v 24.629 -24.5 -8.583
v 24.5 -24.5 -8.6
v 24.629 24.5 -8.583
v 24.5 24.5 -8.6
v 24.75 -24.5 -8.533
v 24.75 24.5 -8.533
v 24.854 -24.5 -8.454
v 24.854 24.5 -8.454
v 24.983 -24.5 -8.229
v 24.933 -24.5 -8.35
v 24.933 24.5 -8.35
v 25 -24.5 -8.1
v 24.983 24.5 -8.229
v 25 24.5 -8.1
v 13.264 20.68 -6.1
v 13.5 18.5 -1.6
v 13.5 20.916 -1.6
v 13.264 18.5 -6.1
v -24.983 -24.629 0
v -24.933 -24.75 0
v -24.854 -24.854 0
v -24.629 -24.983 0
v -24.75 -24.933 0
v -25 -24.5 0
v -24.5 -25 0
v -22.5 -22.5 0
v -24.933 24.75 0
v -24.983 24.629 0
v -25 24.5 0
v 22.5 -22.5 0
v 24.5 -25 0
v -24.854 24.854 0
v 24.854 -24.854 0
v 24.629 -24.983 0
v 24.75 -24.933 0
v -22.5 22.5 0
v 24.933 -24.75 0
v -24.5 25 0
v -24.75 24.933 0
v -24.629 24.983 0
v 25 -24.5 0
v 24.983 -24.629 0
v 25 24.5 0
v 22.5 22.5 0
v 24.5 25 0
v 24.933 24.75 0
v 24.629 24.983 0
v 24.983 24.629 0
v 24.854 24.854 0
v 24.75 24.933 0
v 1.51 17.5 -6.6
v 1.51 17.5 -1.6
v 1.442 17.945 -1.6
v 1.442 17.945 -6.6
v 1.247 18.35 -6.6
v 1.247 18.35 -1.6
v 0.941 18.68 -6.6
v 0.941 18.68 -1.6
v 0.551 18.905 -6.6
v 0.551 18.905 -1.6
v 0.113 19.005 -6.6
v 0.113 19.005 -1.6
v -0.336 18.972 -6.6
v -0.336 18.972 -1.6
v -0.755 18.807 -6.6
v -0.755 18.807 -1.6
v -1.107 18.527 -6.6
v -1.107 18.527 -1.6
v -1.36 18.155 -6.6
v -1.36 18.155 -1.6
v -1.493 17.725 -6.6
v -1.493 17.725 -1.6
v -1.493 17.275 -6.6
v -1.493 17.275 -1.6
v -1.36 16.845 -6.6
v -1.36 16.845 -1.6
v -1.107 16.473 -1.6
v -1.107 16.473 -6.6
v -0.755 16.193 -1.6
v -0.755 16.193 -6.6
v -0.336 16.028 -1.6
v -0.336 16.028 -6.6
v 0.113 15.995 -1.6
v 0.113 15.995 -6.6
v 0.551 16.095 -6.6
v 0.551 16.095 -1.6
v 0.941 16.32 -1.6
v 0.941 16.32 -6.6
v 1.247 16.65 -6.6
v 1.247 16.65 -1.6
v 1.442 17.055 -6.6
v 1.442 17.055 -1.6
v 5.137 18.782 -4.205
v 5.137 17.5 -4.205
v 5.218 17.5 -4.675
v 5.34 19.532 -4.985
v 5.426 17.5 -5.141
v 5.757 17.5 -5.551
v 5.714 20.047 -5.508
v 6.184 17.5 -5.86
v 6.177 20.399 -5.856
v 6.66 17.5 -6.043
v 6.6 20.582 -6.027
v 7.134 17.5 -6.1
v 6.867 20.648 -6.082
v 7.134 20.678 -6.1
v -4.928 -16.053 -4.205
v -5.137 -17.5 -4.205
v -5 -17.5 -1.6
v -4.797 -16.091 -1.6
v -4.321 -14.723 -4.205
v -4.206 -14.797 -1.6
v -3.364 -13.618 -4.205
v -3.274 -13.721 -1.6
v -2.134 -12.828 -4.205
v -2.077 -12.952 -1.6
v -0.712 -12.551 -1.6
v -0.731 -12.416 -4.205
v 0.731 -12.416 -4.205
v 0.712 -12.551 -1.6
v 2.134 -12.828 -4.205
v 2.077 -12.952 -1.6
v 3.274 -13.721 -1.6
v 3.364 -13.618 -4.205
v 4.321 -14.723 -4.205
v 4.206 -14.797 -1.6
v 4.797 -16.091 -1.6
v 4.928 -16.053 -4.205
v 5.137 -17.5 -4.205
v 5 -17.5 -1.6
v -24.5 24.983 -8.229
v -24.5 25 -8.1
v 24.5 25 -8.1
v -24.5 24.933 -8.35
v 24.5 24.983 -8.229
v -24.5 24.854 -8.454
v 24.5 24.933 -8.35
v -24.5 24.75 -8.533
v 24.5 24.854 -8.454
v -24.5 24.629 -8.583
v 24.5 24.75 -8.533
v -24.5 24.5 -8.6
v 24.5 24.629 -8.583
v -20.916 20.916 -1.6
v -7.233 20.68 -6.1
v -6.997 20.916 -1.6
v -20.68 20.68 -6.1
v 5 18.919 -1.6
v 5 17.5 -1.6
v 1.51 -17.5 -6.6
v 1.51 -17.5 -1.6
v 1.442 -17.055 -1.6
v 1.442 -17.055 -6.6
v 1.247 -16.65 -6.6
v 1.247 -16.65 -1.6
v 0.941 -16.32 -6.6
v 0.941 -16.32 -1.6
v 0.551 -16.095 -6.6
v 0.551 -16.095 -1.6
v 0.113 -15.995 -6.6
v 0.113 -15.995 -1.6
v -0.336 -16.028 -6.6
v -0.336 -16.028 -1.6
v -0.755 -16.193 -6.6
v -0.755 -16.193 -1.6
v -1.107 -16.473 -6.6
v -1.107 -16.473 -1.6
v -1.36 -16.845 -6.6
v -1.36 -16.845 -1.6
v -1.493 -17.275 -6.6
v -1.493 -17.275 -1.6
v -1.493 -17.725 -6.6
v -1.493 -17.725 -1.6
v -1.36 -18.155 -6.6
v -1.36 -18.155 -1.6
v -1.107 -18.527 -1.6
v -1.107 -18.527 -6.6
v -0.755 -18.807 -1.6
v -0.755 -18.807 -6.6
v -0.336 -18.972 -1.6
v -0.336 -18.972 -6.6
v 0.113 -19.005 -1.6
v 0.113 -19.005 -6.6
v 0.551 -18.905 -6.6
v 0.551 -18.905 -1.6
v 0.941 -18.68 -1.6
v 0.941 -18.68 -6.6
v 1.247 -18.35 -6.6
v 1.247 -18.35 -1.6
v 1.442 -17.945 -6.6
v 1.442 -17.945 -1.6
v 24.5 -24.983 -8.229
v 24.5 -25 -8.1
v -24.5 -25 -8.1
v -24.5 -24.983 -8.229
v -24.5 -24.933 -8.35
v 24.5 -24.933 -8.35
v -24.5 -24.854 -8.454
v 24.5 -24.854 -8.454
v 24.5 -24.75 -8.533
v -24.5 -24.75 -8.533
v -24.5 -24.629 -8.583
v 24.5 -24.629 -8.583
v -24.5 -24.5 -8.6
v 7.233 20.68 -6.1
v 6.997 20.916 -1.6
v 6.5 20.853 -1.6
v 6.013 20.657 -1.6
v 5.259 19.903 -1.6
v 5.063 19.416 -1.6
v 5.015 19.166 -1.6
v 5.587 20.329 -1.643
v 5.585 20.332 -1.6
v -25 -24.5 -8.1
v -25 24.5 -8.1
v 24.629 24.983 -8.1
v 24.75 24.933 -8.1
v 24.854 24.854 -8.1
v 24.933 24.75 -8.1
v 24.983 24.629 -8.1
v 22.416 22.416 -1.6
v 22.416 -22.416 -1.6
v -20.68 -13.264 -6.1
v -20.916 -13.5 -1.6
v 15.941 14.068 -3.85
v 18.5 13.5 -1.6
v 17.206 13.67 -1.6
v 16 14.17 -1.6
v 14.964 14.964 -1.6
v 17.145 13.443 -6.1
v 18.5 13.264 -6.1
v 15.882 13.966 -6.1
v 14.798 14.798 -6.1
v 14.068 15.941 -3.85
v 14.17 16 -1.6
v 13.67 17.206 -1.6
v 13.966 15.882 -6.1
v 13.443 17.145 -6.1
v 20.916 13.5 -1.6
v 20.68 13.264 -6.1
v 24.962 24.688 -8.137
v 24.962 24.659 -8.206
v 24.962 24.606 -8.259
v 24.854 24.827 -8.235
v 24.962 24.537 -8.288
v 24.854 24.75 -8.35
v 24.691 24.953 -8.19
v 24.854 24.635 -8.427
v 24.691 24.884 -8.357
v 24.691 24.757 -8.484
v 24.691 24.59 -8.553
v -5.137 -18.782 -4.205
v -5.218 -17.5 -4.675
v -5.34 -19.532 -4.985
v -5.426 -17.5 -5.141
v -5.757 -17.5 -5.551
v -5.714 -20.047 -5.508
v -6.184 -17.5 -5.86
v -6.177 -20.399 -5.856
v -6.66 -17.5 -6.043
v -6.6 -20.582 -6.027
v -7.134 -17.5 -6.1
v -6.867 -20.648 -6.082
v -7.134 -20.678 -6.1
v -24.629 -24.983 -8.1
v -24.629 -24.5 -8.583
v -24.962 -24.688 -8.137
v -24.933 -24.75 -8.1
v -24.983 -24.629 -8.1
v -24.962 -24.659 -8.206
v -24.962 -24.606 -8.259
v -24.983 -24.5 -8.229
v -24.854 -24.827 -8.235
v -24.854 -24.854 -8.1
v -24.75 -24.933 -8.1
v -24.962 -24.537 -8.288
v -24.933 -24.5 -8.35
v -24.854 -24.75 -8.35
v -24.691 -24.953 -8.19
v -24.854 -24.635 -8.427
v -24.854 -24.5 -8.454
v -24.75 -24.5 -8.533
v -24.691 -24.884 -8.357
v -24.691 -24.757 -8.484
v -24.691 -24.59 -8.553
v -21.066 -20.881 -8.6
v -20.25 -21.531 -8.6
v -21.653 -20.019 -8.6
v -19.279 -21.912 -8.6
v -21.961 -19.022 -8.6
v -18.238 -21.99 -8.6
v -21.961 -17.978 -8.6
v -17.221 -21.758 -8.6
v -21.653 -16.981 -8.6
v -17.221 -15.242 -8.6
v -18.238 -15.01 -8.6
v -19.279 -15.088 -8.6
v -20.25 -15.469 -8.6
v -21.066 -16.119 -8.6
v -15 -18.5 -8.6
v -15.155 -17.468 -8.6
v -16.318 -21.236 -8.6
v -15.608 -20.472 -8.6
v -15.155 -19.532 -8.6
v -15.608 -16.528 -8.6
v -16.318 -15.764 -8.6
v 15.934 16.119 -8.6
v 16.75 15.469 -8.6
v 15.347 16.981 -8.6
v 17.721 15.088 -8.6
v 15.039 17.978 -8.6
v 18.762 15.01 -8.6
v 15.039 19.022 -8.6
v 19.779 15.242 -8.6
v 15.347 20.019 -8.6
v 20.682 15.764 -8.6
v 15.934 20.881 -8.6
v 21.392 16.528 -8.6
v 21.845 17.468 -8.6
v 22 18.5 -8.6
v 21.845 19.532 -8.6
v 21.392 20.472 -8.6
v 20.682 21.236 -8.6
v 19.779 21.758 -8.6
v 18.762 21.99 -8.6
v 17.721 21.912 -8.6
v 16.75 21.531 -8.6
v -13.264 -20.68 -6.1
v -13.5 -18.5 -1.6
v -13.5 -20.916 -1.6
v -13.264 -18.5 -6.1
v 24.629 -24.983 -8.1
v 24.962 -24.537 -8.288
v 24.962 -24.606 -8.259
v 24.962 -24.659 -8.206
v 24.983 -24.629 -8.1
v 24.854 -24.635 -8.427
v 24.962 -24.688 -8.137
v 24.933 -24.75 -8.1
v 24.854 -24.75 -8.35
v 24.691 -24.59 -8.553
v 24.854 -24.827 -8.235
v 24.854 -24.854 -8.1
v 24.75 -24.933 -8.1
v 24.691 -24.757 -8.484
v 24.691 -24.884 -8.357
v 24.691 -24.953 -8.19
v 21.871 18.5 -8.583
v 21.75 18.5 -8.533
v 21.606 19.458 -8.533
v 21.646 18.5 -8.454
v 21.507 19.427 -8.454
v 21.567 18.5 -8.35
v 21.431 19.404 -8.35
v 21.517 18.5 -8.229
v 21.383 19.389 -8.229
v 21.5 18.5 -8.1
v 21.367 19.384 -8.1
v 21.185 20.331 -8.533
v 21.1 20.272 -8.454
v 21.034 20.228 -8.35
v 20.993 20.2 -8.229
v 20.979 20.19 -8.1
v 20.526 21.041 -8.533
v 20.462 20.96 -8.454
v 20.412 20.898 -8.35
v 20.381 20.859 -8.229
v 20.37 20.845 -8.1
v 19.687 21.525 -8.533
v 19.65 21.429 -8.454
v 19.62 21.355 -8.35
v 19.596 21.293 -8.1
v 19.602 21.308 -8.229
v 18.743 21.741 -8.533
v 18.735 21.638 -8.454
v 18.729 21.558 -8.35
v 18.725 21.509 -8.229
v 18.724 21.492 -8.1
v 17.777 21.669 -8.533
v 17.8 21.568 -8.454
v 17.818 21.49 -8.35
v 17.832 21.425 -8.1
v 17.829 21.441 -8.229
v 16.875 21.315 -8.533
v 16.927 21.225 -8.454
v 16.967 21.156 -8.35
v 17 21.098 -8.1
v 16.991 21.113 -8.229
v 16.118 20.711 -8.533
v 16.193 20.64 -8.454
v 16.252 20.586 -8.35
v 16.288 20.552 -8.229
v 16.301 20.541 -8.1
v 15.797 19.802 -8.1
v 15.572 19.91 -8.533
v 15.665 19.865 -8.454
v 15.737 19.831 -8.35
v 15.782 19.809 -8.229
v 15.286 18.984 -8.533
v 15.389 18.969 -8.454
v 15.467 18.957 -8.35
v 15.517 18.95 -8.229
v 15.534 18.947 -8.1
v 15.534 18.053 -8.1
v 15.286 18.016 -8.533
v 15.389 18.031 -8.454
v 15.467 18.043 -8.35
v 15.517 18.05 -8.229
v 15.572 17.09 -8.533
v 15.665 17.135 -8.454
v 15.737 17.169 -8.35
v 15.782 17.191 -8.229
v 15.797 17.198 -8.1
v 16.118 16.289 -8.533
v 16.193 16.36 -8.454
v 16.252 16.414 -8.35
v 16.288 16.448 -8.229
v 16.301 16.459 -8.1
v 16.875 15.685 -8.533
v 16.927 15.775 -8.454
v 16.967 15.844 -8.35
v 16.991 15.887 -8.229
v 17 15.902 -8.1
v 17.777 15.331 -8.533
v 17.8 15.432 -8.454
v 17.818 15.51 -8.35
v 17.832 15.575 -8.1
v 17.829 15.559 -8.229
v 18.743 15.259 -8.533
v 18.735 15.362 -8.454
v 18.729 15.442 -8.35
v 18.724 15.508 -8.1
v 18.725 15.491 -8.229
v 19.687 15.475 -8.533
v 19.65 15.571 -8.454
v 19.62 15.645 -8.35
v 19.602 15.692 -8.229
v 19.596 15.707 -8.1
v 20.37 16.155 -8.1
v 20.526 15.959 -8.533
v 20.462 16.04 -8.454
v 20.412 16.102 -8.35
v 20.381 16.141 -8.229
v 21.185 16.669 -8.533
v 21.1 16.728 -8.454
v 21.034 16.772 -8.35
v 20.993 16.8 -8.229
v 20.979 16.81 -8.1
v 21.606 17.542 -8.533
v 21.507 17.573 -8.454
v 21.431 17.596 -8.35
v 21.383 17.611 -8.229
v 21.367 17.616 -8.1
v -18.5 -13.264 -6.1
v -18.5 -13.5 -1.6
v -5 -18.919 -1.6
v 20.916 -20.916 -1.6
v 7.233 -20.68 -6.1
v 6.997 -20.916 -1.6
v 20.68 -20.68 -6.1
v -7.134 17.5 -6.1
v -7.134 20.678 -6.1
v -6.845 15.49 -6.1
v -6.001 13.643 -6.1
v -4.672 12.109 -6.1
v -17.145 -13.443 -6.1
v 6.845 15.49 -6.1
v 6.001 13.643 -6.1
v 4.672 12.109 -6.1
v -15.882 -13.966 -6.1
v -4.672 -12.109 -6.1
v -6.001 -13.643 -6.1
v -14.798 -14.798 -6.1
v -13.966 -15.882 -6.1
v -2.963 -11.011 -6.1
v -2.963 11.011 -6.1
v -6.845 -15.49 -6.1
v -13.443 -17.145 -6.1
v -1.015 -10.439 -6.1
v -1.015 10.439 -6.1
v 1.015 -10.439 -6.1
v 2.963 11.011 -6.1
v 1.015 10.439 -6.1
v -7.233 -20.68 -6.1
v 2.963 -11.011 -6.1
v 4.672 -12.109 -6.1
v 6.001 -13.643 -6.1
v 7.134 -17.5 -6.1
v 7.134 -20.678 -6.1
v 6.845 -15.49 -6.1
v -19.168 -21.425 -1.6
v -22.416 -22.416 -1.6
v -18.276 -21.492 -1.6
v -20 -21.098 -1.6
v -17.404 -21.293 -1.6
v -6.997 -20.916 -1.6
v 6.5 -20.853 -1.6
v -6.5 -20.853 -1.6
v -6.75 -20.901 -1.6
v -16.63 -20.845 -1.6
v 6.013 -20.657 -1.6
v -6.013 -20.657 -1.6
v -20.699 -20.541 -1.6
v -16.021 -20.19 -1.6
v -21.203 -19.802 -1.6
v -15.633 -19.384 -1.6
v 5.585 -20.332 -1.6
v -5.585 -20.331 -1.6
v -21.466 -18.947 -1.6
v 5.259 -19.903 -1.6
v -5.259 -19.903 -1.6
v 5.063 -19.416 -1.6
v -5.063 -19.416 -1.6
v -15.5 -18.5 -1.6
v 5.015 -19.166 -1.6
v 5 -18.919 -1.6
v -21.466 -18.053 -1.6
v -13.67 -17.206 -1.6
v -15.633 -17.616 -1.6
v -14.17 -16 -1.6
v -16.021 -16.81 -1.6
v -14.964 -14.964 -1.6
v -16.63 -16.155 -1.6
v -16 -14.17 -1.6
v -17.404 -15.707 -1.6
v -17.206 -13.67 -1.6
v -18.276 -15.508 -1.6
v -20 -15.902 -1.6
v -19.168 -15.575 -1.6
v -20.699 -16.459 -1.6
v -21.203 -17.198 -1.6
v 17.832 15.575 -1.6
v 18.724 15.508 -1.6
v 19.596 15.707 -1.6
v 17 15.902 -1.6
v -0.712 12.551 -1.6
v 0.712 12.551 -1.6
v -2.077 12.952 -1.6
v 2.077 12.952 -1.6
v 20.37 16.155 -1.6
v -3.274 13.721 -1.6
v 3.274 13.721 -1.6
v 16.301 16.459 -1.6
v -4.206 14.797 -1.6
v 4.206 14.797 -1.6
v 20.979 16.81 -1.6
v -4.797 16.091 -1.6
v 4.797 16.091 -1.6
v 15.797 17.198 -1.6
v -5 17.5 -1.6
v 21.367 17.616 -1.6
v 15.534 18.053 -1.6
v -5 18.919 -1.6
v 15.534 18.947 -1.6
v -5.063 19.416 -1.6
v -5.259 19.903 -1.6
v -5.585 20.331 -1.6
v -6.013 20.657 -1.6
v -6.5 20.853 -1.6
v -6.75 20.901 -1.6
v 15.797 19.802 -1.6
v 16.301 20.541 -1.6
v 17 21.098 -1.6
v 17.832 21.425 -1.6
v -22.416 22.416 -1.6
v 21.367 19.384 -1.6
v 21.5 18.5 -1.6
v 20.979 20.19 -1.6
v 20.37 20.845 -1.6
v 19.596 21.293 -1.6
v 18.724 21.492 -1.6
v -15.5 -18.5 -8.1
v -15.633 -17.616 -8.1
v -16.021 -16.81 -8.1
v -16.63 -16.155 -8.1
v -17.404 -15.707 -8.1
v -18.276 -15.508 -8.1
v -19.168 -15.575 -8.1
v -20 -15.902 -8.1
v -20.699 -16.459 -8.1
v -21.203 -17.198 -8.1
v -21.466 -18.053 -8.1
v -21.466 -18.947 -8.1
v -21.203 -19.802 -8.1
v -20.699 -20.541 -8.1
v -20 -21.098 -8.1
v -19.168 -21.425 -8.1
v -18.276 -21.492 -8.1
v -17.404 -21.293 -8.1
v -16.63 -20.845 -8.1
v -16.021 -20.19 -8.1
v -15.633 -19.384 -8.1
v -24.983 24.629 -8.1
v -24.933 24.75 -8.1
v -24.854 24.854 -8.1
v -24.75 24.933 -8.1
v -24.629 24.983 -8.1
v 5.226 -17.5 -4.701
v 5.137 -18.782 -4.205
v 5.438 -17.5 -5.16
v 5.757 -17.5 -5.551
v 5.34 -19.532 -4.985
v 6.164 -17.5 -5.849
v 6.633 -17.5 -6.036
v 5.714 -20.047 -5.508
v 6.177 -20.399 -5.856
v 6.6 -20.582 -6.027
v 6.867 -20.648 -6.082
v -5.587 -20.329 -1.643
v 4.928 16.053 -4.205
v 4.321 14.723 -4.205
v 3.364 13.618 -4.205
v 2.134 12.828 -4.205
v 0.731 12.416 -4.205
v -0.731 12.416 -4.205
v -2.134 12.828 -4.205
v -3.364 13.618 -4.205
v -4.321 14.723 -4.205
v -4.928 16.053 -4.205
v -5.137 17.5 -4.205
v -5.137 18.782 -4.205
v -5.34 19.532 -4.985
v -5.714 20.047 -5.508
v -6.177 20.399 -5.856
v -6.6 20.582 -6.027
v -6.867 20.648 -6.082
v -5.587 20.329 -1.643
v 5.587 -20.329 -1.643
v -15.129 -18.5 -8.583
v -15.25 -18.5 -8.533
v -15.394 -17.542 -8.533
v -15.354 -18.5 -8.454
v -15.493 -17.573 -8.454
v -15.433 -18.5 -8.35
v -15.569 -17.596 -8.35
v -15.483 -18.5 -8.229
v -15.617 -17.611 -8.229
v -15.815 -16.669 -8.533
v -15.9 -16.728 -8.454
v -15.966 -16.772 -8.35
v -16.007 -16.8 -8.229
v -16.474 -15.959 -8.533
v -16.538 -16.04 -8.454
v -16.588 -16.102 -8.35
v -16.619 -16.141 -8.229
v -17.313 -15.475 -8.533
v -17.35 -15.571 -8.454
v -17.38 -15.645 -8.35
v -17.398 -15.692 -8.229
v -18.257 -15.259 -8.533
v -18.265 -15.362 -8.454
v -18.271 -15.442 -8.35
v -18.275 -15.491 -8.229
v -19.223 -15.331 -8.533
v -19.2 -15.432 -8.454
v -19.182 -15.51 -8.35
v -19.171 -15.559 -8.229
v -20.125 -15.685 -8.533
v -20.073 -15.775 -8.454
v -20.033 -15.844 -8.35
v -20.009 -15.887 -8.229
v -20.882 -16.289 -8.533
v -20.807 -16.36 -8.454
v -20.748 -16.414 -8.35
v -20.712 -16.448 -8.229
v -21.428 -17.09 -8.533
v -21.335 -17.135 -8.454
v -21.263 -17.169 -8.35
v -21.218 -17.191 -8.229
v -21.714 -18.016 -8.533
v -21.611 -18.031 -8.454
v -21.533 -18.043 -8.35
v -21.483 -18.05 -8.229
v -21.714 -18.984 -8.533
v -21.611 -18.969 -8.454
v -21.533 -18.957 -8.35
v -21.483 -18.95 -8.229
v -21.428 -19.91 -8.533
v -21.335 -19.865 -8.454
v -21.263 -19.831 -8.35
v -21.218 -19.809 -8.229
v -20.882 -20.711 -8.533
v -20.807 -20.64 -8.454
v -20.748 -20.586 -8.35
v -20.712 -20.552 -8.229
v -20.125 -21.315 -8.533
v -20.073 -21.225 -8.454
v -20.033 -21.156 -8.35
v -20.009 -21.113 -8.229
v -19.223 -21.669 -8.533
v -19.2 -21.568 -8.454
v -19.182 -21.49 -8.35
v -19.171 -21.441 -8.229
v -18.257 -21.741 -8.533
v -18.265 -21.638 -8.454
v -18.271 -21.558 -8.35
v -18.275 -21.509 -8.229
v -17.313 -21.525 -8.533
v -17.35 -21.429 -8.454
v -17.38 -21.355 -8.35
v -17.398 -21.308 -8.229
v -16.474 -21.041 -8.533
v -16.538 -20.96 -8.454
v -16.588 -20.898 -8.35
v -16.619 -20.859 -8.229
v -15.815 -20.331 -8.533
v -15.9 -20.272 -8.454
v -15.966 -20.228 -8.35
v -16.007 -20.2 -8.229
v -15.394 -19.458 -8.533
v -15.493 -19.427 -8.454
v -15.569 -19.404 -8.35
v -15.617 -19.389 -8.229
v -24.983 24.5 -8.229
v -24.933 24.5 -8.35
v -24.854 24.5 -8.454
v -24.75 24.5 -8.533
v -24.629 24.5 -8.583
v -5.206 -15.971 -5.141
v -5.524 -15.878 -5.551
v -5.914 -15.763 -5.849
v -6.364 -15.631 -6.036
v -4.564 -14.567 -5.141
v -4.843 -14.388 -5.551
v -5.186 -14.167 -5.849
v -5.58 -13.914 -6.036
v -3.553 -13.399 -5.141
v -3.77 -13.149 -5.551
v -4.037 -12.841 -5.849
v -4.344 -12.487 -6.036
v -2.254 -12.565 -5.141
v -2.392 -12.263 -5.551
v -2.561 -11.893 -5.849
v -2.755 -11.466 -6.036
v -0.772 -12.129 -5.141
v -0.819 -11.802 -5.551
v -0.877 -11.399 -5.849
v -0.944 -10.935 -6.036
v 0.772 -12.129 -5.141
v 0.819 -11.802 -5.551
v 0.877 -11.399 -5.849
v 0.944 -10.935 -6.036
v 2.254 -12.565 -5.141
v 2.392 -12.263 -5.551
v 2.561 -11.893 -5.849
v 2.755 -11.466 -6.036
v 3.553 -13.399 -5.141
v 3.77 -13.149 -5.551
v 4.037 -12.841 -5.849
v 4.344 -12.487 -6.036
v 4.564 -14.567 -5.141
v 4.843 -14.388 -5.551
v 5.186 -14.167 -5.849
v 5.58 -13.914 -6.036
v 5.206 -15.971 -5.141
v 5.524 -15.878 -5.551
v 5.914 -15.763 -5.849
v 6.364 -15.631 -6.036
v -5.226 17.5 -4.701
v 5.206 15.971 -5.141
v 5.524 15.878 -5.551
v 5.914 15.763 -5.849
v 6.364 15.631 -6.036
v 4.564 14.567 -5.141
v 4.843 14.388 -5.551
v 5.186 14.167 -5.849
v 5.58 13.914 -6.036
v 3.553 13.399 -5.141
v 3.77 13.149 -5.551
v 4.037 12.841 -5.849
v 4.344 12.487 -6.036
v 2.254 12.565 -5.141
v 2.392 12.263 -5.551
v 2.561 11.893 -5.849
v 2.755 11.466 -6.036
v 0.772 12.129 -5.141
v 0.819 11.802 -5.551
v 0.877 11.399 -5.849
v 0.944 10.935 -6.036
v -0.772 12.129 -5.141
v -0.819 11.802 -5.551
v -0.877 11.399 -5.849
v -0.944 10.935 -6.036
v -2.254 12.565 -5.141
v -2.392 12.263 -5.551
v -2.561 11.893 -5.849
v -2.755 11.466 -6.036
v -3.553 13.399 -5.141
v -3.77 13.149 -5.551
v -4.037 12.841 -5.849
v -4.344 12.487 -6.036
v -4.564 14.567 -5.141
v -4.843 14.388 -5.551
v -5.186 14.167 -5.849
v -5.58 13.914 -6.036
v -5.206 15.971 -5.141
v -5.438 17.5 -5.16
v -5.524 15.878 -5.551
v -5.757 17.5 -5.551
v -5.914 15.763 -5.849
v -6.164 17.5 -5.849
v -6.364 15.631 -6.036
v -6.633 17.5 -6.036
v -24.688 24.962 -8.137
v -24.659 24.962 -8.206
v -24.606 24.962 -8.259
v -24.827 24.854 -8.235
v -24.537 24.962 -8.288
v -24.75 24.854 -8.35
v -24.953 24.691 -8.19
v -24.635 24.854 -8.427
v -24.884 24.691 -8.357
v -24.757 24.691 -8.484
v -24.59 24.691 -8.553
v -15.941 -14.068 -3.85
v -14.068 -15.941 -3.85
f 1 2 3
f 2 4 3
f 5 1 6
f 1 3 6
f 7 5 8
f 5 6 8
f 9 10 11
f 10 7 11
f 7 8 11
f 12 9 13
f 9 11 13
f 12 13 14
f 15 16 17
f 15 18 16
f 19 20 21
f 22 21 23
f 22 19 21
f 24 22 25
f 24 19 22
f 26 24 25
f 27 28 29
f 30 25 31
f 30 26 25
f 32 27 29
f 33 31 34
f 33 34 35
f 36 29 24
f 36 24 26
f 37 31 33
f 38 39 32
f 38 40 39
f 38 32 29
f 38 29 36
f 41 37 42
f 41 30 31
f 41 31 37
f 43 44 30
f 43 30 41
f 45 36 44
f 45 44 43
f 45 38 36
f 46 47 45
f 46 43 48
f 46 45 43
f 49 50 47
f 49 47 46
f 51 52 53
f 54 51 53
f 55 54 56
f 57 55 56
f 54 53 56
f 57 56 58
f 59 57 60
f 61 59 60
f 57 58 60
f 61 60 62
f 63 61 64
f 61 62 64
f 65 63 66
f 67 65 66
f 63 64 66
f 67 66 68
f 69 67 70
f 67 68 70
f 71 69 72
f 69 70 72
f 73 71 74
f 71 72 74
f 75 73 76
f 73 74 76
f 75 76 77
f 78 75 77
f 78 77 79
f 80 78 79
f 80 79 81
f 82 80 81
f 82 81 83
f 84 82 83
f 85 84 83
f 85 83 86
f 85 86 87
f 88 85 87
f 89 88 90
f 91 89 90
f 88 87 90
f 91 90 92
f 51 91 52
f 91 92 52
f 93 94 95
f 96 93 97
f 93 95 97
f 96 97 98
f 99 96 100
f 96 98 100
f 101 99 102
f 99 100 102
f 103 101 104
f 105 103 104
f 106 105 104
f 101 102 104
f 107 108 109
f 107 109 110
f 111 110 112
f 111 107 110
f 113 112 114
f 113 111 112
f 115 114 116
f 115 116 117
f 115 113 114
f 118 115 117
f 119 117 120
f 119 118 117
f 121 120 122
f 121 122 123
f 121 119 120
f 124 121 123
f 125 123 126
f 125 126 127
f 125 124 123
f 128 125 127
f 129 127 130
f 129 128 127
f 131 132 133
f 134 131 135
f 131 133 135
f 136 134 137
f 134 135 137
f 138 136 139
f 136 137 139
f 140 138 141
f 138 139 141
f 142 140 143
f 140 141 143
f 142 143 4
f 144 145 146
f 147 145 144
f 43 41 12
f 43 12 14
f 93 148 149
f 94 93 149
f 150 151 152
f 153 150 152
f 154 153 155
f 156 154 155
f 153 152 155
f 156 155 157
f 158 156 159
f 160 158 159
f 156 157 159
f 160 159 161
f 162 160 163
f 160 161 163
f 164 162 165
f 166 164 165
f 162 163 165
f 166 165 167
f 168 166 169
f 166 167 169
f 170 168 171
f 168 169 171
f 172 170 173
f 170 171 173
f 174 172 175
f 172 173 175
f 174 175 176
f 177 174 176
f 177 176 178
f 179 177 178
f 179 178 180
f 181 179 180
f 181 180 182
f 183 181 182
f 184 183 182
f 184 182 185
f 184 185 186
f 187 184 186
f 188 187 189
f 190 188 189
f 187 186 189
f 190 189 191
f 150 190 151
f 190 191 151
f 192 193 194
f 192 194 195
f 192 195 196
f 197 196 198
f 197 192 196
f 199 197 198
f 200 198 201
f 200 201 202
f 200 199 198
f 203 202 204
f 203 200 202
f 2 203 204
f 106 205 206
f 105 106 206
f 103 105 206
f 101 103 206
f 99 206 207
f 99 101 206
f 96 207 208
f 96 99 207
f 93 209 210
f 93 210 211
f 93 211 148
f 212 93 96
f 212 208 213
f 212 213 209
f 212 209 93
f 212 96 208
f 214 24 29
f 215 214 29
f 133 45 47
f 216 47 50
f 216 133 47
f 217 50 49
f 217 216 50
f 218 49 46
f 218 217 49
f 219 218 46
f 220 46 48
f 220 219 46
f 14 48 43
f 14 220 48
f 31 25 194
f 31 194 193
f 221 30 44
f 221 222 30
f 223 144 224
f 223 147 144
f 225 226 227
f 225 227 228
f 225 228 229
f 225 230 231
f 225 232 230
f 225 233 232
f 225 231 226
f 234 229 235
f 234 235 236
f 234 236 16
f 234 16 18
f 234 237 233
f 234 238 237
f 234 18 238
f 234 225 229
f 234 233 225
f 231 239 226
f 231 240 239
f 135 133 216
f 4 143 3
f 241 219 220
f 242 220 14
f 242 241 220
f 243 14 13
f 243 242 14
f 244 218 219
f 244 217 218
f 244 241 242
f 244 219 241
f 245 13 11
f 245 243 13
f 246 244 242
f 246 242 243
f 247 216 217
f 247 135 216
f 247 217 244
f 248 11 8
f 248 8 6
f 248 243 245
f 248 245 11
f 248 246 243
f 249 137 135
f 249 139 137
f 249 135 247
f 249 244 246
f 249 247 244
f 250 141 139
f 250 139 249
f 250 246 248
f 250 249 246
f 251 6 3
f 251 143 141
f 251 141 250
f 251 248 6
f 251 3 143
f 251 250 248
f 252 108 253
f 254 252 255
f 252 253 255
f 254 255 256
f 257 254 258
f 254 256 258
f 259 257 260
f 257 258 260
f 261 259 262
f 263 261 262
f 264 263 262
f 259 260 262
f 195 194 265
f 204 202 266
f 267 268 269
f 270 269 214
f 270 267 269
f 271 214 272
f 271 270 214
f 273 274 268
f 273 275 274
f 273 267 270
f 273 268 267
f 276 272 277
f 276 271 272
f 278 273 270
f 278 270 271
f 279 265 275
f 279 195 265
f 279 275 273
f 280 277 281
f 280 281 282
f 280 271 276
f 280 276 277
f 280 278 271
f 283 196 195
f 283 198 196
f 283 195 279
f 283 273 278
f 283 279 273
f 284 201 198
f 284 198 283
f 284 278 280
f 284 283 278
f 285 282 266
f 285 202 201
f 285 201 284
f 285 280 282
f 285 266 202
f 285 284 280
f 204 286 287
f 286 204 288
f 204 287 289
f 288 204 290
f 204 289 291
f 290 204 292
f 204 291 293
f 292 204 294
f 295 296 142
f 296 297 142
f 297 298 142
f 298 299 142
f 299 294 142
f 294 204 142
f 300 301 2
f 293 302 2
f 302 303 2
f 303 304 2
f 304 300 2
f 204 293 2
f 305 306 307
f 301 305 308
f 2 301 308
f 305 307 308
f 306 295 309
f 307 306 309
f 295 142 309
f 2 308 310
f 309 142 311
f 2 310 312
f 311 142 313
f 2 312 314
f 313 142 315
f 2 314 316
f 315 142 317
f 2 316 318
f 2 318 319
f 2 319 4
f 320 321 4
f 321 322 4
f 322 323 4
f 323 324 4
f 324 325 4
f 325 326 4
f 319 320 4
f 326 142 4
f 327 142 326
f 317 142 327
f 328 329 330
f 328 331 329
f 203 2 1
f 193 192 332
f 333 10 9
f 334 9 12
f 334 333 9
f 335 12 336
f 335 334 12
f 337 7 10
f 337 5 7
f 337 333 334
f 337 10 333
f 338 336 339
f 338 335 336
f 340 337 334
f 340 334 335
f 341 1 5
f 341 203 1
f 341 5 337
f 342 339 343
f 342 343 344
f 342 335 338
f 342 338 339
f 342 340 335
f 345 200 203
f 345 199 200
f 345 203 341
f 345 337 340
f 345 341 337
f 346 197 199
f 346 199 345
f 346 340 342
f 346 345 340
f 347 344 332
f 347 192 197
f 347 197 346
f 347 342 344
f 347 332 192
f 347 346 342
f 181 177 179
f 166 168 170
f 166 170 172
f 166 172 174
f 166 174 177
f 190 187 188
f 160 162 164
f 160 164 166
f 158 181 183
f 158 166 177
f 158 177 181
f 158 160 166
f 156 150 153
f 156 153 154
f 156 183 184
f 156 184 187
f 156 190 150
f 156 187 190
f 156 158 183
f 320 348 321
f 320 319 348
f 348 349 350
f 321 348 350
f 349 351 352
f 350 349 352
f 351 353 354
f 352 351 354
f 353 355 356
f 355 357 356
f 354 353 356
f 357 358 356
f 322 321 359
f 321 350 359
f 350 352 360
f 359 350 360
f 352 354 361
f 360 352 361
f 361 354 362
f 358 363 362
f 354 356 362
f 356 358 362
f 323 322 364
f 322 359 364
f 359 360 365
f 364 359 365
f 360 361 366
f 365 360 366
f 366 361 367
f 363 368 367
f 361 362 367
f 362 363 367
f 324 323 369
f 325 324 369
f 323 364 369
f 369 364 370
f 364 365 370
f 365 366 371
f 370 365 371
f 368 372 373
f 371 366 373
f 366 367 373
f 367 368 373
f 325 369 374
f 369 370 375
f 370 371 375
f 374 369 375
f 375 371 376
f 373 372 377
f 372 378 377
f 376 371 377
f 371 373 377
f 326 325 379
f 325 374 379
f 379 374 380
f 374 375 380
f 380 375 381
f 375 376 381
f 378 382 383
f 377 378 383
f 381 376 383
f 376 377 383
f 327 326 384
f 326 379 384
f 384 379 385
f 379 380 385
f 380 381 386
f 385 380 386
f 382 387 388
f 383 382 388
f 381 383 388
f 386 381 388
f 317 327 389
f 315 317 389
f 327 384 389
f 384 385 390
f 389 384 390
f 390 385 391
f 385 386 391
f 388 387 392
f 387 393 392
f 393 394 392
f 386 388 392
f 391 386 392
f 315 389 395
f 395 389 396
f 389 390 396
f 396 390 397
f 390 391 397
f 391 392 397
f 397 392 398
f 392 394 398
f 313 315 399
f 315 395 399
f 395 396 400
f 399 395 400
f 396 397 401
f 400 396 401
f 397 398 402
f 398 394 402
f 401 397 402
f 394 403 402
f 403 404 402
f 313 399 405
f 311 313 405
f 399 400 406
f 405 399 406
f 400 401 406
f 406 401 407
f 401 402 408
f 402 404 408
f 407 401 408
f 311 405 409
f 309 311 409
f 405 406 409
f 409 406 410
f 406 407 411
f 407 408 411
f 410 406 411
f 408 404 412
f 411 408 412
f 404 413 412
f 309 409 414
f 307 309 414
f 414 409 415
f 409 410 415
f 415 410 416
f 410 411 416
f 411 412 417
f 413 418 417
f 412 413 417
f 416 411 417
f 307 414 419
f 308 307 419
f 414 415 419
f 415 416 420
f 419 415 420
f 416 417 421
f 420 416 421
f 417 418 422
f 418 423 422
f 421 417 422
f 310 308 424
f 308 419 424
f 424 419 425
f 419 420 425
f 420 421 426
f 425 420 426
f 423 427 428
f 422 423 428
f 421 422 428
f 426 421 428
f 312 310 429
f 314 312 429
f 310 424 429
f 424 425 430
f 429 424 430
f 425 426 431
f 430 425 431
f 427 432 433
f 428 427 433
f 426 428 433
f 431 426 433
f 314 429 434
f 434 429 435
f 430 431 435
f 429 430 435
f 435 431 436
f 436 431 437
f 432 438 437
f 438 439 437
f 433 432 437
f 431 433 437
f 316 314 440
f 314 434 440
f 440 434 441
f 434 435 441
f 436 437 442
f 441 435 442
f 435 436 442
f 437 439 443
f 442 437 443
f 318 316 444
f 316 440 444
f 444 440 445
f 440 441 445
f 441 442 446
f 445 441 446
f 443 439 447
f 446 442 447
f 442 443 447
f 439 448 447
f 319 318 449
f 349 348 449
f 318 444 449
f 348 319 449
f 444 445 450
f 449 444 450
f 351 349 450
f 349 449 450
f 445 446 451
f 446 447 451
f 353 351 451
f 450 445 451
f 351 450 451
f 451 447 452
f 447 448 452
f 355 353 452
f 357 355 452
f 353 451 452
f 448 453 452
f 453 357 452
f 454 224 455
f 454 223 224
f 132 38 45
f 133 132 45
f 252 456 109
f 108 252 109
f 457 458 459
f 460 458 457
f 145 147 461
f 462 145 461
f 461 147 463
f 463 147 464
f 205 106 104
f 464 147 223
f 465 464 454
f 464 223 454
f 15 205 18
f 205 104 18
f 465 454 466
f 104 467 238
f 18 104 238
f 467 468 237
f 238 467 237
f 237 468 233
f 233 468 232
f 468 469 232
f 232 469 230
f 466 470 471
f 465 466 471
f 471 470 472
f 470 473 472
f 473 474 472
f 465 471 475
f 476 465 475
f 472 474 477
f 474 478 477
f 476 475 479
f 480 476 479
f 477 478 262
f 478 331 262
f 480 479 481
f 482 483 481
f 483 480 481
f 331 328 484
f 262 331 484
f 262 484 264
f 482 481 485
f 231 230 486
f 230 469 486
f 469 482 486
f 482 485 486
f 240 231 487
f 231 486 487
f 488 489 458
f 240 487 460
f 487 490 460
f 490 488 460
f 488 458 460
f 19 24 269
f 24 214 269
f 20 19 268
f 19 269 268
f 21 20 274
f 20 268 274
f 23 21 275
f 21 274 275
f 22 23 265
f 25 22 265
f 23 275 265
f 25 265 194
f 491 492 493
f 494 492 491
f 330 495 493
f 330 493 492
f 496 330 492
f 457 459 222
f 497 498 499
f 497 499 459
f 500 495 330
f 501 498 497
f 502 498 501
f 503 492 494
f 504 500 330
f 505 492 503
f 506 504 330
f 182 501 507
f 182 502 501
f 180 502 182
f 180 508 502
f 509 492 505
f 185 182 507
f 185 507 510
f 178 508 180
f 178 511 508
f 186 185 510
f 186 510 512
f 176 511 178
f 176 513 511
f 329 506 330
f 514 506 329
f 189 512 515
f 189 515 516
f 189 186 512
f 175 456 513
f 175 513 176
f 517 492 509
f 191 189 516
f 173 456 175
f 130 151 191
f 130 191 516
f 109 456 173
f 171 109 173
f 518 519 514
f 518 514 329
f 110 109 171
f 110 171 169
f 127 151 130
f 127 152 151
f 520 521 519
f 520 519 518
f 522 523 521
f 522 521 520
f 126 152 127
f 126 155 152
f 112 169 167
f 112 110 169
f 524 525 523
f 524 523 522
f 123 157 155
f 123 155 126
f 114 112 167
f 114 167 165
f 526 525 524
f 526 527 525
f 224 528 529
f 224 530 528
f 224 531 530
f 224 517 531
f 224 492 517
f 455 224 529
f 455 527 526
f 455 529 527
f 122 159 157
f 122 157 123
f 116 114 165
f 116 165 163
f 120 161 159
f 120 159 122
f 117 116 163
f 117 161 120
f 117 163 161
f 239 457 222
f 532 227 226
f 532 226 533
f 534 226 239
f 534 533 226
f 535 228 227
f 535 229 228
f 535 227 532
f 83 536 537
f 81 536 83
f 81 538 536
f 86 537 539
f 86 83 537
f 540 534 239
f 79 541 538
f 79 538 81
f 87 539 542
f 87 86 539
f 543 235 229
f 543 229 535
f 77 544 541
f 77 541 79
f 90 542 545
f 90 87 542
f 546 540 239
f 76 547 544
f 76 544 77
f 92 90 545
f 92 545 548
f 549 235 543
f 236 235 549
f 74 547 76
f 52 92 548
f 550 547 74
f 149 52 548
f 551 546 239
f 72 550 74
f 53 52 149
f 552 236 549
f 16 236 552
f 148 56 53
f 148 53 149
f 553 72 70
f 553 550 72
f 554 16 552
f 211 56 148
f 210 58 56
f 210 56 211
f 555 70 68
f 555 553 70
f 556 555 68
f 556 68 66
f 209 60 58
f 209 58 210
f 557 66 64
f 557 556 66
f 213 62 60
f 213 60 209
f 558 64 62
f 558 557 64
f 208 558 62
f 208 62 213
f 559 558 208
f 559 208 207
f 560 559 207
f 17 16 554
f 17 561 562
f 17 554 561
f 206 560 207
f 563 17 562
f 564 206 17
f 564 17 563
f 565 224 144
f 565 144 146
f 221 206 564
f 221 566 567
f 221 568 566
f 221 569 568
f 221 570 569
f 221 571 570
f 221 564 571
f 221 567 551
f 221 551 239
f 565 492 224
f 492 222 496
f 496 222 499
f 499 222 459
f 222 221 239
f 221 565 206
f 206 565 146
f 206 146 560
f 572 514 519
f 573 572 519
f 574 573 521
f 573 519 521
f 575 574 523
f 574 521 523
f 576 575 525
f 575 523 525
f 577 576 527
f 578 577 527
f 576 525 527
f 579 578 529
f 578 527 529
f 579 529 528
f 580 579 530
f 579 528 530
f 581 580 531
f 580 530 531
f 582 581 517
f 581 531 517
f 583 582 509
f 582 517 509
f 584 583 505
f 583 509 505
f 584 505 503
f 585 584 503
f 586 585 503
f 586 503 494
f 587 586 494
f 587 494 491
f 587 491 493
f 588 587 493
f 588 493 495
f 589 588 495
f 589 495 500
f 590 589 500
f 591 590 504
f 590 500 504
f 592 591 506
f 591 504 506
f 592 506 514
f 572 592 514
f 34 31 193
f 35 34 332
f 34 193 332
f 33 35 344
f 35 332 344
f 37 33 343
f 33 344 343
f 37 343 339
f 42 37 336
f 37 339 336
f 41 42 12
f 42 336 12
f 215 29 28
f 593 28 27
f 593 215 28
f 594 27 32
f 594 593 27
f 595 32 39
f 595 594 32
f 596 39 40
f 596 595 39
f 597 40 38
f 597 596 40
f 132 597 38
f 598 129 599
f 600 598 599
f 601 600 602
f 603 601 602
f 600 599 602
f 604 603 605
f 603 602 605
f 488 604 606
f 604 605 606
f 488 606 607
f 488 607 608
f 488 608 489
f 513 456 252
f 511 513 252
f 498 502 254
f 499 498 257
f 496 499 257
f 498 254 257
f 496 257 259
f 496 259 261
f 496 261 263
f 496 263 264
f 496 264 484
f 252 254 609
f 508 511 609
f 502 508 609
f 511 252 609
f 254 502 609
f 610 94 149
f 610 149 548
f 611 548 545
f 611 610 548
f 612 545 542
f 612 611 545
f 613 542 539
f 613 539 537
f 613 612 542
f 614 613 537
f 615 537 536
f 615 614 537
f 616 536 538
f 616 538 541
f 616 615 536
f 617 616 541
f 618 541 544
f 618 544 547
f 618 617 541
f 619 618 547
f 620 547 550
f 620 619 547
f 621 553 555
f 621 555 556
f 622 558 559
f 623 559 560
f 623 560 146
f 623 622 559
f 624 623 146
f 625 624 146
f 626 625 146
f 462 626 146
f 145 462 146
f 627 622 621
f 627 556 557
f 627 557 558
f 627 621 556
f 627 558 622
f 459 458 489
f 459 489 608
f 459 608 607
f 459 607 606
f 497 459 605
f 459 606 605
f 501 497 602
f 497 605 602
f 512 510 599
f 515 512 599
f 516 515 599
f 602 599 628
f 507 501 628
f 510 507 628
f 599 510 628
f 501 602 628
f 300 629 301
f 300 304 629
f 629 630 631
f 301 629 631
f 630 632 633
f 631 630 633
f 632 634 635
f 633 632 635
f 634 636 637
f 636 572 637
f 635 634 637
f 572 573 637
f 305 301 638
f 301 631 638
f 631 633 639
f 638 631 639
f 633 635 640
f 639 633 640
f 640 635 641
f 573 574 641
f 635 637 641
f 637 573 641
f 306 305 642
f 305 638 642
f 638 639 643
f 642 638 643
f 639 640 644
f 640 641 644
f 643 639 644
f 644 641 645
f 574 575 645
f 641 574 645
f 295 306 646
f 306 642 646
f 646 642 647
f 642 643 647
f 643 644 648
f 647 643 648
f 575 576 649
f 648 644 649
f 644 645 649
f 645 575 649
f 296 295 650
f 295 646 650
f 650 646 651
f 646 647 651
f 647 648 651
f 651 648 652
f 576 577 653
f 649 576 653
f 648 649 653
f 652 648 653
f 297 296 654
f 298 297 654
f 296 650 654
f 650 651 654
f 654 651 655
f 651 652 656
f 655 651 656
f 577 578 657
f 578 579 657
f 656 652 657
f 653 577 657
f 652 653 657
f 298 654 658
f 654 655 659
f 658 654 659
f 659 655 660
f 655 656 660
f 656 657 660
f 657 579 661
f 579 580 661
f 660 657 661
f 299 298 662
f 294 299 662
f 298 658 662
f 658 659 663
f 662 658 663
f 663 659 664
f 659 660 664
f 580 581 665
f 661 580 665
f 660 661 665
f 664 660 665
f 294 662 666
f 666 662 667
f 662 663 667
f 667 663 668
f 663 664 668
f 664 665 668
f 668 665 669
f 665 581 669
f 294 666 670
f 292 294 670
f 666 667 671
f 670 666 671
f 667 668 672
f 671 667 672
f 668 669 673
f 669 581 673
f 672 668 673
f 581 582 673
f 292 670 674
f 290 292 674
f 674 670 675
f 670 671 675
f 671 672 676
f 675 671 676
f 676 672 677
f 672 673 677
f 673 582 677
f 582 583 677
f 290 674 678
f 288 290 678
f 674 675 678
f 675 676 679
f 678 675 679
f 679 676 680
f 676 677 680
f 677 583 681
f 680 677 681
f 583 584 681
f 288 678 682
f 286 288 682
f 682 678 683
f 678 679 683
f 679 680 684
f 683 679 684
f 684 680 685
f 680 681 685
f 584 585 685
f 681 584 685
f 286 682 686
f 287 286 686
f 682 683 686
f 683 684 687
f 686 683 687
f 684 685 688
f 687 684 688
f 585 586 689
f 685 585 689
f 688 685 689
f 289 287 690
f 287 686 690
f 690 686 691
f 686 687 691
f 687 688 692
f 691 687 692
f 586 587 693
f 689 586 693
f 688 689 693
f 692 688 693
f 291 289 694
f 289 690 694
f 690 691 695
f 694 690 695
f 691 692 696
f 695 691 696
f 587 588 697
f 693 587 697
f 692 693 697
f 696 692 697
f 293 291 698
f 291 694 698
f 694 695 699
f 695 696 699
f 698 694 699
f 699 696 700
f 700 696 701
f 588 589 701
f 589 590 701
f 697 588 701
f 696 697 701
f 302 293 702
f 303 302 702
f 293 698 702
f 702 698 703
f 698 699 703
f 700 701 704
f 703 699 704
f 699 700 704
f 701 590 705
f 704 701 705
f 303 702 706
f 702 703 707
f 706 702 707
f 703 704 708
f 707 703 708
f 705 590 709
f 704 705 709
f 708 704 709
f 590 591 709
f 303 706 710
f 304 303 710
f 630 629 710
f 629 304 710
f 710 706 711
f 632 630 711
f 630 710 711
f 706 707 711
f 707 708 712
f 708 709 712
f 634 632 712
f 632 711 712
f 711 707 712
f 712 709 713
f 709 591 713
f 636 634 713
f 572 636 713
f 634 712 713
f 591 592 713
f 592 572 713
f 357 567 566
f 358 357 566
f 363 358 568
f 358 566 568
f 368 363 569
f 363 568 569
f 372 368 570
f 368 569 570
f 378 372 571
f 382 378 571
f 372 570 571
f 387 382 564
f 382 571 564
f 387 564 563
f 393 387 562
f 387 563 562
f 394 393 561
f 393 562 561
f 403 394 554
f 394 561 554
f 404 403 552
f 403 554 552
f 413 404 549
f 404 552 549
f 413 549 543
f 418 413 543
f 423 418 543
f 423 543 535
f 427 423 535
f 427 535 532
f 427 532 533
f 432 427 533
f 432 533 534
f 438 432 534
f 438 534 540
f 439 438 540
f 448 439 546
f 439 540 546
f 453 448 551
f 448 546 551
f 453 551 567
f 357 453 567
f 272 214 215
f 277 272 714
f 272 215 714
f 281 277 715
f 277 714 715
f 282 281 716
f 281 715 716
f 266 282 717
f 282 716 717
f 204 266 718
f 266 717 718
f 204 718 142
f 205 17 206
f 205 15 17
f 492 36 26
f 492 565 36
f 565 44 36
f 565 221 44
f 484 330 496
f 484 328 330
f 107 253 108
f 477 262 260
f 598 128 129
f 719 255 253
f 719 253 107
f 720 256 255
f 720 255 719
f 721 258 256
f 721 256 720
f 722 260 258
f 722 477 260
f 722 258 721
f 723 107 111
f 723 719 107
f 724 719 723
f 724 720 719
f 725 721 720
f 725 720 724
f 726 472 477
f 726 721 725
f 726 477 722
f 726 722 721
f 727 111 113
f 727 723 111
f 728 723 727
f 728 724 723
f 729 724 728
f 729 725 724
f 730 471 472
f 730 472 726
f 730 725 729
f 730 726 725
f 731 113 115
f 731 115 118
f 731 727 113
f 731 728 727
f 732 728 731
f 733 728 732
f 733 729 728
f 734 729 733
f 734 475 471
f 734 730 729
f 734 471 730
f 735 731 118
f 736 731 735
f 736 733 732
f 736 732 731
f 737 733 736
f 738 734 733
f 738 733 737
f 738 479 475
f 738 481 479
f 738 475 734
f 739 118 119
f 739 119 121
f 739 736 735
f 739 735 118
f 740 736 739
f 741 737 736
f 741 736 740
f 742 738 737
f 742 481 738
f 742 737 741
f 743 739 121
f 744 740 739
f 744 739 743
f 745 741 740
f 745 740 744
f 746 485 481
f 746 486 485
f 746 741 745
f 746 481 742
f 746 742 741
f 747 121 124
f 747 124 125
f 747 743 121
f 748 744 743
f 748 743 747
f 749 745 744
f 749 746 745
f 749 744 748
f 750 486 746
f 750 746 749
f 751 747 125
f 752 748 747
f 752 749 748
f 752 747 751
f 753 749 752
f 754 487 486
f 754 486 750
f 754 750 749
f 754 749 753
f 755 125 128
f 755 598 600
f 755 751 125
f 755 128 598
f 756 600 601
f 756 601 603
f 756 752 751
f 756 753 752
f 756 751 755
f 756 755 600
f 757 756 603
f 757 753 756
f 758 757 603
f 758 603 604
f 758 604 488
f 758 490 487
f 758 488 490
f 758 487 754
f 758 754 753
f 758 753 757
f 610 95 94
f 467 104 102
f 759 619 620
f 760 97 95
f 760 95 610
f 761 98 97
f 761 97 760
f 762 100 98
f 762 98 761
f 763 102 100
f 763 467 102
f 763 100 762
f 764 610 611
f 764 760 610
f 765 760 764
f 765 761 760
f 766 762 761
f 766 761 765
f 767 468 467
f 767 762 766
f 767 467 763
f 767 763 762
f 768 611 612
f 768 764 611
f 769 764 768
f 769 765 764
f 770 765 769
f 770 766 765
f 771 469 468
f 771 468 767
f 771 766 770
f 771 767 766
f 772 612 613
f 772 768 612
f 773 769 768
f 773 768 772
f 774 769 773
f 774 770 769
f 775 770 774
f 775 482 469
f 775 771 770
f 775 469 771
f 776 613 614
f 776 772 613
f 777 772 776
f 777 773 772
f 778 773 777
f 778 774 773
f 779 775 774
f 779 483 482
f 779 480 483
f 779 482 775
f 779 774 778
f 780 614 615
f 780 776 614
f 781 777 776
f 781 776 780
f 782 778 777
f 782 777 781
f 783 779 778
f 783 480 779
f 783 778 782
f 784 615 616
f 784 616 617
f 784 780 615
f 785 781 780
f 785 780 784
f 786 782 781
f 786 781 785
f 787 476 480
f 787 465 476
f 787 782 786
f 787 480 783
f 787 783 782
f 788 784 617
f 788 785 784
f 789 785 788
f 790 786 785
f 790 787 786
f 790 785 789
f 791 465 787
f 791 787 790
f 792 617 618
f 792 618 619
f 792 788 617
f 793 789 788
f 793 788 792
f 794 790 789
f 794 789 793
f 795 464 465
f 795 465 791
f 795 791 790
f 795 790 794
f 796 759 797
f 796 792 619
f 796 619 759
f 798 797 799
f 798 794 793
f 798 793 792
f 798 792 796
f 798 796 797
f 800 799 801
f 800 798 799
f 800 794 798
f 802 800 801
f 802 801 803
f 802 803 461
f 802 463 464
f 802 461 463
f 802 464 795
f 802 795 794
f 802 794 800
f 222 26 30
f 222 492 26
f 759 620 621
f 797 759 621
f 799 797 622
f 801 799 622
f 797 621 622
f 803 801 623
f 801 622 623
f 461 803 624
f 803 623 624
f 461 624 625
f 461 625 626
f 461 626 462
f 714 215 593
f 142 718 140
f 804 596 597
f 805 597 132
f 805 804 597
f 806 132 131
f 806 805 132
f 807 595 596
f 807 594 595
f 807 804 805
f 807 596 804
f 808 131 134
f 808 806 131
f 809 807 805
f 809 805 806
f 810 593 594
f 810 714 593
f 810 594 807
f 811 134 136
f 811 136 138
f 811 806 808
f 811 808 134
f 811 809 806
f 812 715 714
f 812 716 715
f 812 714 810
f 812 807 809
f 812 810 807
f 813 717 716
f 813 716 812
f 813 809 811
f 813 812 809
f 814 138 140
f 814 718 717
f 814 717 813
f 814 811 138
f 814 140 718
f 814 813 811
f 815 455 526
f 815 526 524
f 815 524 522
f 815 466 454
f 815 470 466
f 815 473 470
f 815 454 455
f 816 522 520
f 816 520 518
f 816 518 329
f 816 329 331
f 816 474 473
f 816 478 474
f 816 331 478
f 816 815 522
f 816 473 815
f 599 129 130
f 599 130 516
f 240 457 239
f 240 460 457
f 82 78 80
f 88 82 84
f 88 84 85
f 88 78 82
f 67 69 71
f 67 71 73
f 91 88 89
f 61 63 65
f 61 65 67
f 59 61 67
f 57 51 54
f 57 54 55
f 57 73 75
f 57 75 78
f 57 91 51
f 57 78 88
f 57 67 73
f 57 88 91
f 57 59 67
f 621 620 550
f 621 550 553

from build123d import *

# Parameters (mm, degrees)
F0_W      = 50
F0_H      = 50
F1_DEPTH  = 8.6
F2_W      = 45
F2_H      = 45
F3_DEPTH  = 1.6
F3_TAPER  = 3
F5_DEPTH  = 4.5
F5_TAPER  = 3
F6_R      = 3
F7_DEPTH  = 7
F8_R      = 0.5
F9_R      = 1.5095
F10_DEPTH = 5
F11_R     = 2


with BuildPart() as f1:
    # F0 (on Top) → F1 (new body)
    with BuildSketch(Plane.XY):
        Rectangle(F0_W, F0_H)
    extrude(amount=-F1_DEPTH)

    # F2 (on face) → F3 (cut)
    with BuildSketch(Plane.XY):
        Rectangle(F2_W, F2_H)
    extrude(amount=-F3_DEPTH, taper=F3_TAPER, mode=Mode.SUBTRACT)

    # F4 (on face) → F5 (cut)
    with BuildSketch(Plane.XY.offset(-1.6)):
        with BuildLine():
            Line((13.5, 18.5), (13.5, 20.9161475531))
            Line((13.5, 20.9161475531), (5, 20.9161475531))
            Line((5, 20.9161475531), (5, 17.5))
            ThreePointArc((5, 17.5), (0, 12.5), (-5, 17.5))
            Line((-5, 17.5), (-5, 20.9161475531))
            Line((-5, 20.9161475531), (-20.9161475531, 20.9161475531))
            Line((-20.9161475531, 20.9161475531), (-20.9161475531, -13.5))
            Line((-20.9161475531, -13.5), (-18.5, -13.5))
            ThreePointArc((-18.5, -13.5), (-14.9644660941, -14.9644660941), (-13.5, -18.5))
            Line((-13.5, -18.5), (-13.5, -20.9161475531))
            Line((-13.5, -20.9161475531), (-5, -20.9161475531))
            Line((-5, -20.9161475531), (-5, -17.5))
            ThreePointArc((-5, -17.5), (0, -12.5), (5, -17.5))
            Line((5, -17.5), (5, -20.9161475531))
            Line((5, -20.9161475531), (20.9161475531, -20.9161475531))
            Line((20.9161475531, -20.9161475531), (20.9161475531, 13.5))
            Line((20.9161475531, 13.5), (18.5, 13.5))
            ThreePointArc((18.5, 13.5), (14.9644660941, 14.9644660941), (13.5, 18.5))
        make_face()
    extrude(amount=-F5_DEPTH, taper=F5_TAPER, mode=Mode.SUBTRACT)

    # F6 (on face) → F7 (cut, through all)
    with BuildSketch(Plane.XY.offset(-1.6)):
        with Locations((18.5, 18.5)):
            Circle(F6_R)
        with Locations((-18.5, -18.5)):
            Circle(F6_R)
    extrude(amount=-F7_DEPTH, mode=Mode.SUBTRACT)

    # F8
    f8_edges = [f1.edges().sort_by_distance(p)[0] for p in [
        (0, -25, -8.6),
        (-25, -25, -4.3),
        (-25, 0, -8.6),
        (-21.5, -18.5, -8.6),
        (15.5, 18.5, -8.6),
        (-25, 25, -4.3),
        (0, 25, -8.6),
        (25, 25, -4.3),
        (25, 0, -8.6),
        (25, -25, -4.3),
    ]]
    fillet(f8_edges, radius=F8_R)

    # F9 (on face) → F10 (cut)
    with BuildSketch(Plane.XY.offset(-1.6)):
        with Locations((0, 17.5)):
            Circle(F9_R)
        with Locations((0, -17.5)):
            Circle(F9_R)
    extrude(amount=-F10_DEPTH, mode=Mode.SUBTRACT)

    # F11
    f11_edges = [f1.edges().sort_by_distance(p)[0] for p in [
        (5.117918, 20.79823, -3.85),
        (0, 12.264165, -6.1),
        (-5.117918, 20.79823, -3.85),
        (-5.117918, -20.79823, -3.85),
        (-5.235835, -19.090156, -6.1),
        (5.117918, -20.79823, -3.85),
    ]]
    fillet(f11_edges, radius=F11_R)


solid = f1.part
